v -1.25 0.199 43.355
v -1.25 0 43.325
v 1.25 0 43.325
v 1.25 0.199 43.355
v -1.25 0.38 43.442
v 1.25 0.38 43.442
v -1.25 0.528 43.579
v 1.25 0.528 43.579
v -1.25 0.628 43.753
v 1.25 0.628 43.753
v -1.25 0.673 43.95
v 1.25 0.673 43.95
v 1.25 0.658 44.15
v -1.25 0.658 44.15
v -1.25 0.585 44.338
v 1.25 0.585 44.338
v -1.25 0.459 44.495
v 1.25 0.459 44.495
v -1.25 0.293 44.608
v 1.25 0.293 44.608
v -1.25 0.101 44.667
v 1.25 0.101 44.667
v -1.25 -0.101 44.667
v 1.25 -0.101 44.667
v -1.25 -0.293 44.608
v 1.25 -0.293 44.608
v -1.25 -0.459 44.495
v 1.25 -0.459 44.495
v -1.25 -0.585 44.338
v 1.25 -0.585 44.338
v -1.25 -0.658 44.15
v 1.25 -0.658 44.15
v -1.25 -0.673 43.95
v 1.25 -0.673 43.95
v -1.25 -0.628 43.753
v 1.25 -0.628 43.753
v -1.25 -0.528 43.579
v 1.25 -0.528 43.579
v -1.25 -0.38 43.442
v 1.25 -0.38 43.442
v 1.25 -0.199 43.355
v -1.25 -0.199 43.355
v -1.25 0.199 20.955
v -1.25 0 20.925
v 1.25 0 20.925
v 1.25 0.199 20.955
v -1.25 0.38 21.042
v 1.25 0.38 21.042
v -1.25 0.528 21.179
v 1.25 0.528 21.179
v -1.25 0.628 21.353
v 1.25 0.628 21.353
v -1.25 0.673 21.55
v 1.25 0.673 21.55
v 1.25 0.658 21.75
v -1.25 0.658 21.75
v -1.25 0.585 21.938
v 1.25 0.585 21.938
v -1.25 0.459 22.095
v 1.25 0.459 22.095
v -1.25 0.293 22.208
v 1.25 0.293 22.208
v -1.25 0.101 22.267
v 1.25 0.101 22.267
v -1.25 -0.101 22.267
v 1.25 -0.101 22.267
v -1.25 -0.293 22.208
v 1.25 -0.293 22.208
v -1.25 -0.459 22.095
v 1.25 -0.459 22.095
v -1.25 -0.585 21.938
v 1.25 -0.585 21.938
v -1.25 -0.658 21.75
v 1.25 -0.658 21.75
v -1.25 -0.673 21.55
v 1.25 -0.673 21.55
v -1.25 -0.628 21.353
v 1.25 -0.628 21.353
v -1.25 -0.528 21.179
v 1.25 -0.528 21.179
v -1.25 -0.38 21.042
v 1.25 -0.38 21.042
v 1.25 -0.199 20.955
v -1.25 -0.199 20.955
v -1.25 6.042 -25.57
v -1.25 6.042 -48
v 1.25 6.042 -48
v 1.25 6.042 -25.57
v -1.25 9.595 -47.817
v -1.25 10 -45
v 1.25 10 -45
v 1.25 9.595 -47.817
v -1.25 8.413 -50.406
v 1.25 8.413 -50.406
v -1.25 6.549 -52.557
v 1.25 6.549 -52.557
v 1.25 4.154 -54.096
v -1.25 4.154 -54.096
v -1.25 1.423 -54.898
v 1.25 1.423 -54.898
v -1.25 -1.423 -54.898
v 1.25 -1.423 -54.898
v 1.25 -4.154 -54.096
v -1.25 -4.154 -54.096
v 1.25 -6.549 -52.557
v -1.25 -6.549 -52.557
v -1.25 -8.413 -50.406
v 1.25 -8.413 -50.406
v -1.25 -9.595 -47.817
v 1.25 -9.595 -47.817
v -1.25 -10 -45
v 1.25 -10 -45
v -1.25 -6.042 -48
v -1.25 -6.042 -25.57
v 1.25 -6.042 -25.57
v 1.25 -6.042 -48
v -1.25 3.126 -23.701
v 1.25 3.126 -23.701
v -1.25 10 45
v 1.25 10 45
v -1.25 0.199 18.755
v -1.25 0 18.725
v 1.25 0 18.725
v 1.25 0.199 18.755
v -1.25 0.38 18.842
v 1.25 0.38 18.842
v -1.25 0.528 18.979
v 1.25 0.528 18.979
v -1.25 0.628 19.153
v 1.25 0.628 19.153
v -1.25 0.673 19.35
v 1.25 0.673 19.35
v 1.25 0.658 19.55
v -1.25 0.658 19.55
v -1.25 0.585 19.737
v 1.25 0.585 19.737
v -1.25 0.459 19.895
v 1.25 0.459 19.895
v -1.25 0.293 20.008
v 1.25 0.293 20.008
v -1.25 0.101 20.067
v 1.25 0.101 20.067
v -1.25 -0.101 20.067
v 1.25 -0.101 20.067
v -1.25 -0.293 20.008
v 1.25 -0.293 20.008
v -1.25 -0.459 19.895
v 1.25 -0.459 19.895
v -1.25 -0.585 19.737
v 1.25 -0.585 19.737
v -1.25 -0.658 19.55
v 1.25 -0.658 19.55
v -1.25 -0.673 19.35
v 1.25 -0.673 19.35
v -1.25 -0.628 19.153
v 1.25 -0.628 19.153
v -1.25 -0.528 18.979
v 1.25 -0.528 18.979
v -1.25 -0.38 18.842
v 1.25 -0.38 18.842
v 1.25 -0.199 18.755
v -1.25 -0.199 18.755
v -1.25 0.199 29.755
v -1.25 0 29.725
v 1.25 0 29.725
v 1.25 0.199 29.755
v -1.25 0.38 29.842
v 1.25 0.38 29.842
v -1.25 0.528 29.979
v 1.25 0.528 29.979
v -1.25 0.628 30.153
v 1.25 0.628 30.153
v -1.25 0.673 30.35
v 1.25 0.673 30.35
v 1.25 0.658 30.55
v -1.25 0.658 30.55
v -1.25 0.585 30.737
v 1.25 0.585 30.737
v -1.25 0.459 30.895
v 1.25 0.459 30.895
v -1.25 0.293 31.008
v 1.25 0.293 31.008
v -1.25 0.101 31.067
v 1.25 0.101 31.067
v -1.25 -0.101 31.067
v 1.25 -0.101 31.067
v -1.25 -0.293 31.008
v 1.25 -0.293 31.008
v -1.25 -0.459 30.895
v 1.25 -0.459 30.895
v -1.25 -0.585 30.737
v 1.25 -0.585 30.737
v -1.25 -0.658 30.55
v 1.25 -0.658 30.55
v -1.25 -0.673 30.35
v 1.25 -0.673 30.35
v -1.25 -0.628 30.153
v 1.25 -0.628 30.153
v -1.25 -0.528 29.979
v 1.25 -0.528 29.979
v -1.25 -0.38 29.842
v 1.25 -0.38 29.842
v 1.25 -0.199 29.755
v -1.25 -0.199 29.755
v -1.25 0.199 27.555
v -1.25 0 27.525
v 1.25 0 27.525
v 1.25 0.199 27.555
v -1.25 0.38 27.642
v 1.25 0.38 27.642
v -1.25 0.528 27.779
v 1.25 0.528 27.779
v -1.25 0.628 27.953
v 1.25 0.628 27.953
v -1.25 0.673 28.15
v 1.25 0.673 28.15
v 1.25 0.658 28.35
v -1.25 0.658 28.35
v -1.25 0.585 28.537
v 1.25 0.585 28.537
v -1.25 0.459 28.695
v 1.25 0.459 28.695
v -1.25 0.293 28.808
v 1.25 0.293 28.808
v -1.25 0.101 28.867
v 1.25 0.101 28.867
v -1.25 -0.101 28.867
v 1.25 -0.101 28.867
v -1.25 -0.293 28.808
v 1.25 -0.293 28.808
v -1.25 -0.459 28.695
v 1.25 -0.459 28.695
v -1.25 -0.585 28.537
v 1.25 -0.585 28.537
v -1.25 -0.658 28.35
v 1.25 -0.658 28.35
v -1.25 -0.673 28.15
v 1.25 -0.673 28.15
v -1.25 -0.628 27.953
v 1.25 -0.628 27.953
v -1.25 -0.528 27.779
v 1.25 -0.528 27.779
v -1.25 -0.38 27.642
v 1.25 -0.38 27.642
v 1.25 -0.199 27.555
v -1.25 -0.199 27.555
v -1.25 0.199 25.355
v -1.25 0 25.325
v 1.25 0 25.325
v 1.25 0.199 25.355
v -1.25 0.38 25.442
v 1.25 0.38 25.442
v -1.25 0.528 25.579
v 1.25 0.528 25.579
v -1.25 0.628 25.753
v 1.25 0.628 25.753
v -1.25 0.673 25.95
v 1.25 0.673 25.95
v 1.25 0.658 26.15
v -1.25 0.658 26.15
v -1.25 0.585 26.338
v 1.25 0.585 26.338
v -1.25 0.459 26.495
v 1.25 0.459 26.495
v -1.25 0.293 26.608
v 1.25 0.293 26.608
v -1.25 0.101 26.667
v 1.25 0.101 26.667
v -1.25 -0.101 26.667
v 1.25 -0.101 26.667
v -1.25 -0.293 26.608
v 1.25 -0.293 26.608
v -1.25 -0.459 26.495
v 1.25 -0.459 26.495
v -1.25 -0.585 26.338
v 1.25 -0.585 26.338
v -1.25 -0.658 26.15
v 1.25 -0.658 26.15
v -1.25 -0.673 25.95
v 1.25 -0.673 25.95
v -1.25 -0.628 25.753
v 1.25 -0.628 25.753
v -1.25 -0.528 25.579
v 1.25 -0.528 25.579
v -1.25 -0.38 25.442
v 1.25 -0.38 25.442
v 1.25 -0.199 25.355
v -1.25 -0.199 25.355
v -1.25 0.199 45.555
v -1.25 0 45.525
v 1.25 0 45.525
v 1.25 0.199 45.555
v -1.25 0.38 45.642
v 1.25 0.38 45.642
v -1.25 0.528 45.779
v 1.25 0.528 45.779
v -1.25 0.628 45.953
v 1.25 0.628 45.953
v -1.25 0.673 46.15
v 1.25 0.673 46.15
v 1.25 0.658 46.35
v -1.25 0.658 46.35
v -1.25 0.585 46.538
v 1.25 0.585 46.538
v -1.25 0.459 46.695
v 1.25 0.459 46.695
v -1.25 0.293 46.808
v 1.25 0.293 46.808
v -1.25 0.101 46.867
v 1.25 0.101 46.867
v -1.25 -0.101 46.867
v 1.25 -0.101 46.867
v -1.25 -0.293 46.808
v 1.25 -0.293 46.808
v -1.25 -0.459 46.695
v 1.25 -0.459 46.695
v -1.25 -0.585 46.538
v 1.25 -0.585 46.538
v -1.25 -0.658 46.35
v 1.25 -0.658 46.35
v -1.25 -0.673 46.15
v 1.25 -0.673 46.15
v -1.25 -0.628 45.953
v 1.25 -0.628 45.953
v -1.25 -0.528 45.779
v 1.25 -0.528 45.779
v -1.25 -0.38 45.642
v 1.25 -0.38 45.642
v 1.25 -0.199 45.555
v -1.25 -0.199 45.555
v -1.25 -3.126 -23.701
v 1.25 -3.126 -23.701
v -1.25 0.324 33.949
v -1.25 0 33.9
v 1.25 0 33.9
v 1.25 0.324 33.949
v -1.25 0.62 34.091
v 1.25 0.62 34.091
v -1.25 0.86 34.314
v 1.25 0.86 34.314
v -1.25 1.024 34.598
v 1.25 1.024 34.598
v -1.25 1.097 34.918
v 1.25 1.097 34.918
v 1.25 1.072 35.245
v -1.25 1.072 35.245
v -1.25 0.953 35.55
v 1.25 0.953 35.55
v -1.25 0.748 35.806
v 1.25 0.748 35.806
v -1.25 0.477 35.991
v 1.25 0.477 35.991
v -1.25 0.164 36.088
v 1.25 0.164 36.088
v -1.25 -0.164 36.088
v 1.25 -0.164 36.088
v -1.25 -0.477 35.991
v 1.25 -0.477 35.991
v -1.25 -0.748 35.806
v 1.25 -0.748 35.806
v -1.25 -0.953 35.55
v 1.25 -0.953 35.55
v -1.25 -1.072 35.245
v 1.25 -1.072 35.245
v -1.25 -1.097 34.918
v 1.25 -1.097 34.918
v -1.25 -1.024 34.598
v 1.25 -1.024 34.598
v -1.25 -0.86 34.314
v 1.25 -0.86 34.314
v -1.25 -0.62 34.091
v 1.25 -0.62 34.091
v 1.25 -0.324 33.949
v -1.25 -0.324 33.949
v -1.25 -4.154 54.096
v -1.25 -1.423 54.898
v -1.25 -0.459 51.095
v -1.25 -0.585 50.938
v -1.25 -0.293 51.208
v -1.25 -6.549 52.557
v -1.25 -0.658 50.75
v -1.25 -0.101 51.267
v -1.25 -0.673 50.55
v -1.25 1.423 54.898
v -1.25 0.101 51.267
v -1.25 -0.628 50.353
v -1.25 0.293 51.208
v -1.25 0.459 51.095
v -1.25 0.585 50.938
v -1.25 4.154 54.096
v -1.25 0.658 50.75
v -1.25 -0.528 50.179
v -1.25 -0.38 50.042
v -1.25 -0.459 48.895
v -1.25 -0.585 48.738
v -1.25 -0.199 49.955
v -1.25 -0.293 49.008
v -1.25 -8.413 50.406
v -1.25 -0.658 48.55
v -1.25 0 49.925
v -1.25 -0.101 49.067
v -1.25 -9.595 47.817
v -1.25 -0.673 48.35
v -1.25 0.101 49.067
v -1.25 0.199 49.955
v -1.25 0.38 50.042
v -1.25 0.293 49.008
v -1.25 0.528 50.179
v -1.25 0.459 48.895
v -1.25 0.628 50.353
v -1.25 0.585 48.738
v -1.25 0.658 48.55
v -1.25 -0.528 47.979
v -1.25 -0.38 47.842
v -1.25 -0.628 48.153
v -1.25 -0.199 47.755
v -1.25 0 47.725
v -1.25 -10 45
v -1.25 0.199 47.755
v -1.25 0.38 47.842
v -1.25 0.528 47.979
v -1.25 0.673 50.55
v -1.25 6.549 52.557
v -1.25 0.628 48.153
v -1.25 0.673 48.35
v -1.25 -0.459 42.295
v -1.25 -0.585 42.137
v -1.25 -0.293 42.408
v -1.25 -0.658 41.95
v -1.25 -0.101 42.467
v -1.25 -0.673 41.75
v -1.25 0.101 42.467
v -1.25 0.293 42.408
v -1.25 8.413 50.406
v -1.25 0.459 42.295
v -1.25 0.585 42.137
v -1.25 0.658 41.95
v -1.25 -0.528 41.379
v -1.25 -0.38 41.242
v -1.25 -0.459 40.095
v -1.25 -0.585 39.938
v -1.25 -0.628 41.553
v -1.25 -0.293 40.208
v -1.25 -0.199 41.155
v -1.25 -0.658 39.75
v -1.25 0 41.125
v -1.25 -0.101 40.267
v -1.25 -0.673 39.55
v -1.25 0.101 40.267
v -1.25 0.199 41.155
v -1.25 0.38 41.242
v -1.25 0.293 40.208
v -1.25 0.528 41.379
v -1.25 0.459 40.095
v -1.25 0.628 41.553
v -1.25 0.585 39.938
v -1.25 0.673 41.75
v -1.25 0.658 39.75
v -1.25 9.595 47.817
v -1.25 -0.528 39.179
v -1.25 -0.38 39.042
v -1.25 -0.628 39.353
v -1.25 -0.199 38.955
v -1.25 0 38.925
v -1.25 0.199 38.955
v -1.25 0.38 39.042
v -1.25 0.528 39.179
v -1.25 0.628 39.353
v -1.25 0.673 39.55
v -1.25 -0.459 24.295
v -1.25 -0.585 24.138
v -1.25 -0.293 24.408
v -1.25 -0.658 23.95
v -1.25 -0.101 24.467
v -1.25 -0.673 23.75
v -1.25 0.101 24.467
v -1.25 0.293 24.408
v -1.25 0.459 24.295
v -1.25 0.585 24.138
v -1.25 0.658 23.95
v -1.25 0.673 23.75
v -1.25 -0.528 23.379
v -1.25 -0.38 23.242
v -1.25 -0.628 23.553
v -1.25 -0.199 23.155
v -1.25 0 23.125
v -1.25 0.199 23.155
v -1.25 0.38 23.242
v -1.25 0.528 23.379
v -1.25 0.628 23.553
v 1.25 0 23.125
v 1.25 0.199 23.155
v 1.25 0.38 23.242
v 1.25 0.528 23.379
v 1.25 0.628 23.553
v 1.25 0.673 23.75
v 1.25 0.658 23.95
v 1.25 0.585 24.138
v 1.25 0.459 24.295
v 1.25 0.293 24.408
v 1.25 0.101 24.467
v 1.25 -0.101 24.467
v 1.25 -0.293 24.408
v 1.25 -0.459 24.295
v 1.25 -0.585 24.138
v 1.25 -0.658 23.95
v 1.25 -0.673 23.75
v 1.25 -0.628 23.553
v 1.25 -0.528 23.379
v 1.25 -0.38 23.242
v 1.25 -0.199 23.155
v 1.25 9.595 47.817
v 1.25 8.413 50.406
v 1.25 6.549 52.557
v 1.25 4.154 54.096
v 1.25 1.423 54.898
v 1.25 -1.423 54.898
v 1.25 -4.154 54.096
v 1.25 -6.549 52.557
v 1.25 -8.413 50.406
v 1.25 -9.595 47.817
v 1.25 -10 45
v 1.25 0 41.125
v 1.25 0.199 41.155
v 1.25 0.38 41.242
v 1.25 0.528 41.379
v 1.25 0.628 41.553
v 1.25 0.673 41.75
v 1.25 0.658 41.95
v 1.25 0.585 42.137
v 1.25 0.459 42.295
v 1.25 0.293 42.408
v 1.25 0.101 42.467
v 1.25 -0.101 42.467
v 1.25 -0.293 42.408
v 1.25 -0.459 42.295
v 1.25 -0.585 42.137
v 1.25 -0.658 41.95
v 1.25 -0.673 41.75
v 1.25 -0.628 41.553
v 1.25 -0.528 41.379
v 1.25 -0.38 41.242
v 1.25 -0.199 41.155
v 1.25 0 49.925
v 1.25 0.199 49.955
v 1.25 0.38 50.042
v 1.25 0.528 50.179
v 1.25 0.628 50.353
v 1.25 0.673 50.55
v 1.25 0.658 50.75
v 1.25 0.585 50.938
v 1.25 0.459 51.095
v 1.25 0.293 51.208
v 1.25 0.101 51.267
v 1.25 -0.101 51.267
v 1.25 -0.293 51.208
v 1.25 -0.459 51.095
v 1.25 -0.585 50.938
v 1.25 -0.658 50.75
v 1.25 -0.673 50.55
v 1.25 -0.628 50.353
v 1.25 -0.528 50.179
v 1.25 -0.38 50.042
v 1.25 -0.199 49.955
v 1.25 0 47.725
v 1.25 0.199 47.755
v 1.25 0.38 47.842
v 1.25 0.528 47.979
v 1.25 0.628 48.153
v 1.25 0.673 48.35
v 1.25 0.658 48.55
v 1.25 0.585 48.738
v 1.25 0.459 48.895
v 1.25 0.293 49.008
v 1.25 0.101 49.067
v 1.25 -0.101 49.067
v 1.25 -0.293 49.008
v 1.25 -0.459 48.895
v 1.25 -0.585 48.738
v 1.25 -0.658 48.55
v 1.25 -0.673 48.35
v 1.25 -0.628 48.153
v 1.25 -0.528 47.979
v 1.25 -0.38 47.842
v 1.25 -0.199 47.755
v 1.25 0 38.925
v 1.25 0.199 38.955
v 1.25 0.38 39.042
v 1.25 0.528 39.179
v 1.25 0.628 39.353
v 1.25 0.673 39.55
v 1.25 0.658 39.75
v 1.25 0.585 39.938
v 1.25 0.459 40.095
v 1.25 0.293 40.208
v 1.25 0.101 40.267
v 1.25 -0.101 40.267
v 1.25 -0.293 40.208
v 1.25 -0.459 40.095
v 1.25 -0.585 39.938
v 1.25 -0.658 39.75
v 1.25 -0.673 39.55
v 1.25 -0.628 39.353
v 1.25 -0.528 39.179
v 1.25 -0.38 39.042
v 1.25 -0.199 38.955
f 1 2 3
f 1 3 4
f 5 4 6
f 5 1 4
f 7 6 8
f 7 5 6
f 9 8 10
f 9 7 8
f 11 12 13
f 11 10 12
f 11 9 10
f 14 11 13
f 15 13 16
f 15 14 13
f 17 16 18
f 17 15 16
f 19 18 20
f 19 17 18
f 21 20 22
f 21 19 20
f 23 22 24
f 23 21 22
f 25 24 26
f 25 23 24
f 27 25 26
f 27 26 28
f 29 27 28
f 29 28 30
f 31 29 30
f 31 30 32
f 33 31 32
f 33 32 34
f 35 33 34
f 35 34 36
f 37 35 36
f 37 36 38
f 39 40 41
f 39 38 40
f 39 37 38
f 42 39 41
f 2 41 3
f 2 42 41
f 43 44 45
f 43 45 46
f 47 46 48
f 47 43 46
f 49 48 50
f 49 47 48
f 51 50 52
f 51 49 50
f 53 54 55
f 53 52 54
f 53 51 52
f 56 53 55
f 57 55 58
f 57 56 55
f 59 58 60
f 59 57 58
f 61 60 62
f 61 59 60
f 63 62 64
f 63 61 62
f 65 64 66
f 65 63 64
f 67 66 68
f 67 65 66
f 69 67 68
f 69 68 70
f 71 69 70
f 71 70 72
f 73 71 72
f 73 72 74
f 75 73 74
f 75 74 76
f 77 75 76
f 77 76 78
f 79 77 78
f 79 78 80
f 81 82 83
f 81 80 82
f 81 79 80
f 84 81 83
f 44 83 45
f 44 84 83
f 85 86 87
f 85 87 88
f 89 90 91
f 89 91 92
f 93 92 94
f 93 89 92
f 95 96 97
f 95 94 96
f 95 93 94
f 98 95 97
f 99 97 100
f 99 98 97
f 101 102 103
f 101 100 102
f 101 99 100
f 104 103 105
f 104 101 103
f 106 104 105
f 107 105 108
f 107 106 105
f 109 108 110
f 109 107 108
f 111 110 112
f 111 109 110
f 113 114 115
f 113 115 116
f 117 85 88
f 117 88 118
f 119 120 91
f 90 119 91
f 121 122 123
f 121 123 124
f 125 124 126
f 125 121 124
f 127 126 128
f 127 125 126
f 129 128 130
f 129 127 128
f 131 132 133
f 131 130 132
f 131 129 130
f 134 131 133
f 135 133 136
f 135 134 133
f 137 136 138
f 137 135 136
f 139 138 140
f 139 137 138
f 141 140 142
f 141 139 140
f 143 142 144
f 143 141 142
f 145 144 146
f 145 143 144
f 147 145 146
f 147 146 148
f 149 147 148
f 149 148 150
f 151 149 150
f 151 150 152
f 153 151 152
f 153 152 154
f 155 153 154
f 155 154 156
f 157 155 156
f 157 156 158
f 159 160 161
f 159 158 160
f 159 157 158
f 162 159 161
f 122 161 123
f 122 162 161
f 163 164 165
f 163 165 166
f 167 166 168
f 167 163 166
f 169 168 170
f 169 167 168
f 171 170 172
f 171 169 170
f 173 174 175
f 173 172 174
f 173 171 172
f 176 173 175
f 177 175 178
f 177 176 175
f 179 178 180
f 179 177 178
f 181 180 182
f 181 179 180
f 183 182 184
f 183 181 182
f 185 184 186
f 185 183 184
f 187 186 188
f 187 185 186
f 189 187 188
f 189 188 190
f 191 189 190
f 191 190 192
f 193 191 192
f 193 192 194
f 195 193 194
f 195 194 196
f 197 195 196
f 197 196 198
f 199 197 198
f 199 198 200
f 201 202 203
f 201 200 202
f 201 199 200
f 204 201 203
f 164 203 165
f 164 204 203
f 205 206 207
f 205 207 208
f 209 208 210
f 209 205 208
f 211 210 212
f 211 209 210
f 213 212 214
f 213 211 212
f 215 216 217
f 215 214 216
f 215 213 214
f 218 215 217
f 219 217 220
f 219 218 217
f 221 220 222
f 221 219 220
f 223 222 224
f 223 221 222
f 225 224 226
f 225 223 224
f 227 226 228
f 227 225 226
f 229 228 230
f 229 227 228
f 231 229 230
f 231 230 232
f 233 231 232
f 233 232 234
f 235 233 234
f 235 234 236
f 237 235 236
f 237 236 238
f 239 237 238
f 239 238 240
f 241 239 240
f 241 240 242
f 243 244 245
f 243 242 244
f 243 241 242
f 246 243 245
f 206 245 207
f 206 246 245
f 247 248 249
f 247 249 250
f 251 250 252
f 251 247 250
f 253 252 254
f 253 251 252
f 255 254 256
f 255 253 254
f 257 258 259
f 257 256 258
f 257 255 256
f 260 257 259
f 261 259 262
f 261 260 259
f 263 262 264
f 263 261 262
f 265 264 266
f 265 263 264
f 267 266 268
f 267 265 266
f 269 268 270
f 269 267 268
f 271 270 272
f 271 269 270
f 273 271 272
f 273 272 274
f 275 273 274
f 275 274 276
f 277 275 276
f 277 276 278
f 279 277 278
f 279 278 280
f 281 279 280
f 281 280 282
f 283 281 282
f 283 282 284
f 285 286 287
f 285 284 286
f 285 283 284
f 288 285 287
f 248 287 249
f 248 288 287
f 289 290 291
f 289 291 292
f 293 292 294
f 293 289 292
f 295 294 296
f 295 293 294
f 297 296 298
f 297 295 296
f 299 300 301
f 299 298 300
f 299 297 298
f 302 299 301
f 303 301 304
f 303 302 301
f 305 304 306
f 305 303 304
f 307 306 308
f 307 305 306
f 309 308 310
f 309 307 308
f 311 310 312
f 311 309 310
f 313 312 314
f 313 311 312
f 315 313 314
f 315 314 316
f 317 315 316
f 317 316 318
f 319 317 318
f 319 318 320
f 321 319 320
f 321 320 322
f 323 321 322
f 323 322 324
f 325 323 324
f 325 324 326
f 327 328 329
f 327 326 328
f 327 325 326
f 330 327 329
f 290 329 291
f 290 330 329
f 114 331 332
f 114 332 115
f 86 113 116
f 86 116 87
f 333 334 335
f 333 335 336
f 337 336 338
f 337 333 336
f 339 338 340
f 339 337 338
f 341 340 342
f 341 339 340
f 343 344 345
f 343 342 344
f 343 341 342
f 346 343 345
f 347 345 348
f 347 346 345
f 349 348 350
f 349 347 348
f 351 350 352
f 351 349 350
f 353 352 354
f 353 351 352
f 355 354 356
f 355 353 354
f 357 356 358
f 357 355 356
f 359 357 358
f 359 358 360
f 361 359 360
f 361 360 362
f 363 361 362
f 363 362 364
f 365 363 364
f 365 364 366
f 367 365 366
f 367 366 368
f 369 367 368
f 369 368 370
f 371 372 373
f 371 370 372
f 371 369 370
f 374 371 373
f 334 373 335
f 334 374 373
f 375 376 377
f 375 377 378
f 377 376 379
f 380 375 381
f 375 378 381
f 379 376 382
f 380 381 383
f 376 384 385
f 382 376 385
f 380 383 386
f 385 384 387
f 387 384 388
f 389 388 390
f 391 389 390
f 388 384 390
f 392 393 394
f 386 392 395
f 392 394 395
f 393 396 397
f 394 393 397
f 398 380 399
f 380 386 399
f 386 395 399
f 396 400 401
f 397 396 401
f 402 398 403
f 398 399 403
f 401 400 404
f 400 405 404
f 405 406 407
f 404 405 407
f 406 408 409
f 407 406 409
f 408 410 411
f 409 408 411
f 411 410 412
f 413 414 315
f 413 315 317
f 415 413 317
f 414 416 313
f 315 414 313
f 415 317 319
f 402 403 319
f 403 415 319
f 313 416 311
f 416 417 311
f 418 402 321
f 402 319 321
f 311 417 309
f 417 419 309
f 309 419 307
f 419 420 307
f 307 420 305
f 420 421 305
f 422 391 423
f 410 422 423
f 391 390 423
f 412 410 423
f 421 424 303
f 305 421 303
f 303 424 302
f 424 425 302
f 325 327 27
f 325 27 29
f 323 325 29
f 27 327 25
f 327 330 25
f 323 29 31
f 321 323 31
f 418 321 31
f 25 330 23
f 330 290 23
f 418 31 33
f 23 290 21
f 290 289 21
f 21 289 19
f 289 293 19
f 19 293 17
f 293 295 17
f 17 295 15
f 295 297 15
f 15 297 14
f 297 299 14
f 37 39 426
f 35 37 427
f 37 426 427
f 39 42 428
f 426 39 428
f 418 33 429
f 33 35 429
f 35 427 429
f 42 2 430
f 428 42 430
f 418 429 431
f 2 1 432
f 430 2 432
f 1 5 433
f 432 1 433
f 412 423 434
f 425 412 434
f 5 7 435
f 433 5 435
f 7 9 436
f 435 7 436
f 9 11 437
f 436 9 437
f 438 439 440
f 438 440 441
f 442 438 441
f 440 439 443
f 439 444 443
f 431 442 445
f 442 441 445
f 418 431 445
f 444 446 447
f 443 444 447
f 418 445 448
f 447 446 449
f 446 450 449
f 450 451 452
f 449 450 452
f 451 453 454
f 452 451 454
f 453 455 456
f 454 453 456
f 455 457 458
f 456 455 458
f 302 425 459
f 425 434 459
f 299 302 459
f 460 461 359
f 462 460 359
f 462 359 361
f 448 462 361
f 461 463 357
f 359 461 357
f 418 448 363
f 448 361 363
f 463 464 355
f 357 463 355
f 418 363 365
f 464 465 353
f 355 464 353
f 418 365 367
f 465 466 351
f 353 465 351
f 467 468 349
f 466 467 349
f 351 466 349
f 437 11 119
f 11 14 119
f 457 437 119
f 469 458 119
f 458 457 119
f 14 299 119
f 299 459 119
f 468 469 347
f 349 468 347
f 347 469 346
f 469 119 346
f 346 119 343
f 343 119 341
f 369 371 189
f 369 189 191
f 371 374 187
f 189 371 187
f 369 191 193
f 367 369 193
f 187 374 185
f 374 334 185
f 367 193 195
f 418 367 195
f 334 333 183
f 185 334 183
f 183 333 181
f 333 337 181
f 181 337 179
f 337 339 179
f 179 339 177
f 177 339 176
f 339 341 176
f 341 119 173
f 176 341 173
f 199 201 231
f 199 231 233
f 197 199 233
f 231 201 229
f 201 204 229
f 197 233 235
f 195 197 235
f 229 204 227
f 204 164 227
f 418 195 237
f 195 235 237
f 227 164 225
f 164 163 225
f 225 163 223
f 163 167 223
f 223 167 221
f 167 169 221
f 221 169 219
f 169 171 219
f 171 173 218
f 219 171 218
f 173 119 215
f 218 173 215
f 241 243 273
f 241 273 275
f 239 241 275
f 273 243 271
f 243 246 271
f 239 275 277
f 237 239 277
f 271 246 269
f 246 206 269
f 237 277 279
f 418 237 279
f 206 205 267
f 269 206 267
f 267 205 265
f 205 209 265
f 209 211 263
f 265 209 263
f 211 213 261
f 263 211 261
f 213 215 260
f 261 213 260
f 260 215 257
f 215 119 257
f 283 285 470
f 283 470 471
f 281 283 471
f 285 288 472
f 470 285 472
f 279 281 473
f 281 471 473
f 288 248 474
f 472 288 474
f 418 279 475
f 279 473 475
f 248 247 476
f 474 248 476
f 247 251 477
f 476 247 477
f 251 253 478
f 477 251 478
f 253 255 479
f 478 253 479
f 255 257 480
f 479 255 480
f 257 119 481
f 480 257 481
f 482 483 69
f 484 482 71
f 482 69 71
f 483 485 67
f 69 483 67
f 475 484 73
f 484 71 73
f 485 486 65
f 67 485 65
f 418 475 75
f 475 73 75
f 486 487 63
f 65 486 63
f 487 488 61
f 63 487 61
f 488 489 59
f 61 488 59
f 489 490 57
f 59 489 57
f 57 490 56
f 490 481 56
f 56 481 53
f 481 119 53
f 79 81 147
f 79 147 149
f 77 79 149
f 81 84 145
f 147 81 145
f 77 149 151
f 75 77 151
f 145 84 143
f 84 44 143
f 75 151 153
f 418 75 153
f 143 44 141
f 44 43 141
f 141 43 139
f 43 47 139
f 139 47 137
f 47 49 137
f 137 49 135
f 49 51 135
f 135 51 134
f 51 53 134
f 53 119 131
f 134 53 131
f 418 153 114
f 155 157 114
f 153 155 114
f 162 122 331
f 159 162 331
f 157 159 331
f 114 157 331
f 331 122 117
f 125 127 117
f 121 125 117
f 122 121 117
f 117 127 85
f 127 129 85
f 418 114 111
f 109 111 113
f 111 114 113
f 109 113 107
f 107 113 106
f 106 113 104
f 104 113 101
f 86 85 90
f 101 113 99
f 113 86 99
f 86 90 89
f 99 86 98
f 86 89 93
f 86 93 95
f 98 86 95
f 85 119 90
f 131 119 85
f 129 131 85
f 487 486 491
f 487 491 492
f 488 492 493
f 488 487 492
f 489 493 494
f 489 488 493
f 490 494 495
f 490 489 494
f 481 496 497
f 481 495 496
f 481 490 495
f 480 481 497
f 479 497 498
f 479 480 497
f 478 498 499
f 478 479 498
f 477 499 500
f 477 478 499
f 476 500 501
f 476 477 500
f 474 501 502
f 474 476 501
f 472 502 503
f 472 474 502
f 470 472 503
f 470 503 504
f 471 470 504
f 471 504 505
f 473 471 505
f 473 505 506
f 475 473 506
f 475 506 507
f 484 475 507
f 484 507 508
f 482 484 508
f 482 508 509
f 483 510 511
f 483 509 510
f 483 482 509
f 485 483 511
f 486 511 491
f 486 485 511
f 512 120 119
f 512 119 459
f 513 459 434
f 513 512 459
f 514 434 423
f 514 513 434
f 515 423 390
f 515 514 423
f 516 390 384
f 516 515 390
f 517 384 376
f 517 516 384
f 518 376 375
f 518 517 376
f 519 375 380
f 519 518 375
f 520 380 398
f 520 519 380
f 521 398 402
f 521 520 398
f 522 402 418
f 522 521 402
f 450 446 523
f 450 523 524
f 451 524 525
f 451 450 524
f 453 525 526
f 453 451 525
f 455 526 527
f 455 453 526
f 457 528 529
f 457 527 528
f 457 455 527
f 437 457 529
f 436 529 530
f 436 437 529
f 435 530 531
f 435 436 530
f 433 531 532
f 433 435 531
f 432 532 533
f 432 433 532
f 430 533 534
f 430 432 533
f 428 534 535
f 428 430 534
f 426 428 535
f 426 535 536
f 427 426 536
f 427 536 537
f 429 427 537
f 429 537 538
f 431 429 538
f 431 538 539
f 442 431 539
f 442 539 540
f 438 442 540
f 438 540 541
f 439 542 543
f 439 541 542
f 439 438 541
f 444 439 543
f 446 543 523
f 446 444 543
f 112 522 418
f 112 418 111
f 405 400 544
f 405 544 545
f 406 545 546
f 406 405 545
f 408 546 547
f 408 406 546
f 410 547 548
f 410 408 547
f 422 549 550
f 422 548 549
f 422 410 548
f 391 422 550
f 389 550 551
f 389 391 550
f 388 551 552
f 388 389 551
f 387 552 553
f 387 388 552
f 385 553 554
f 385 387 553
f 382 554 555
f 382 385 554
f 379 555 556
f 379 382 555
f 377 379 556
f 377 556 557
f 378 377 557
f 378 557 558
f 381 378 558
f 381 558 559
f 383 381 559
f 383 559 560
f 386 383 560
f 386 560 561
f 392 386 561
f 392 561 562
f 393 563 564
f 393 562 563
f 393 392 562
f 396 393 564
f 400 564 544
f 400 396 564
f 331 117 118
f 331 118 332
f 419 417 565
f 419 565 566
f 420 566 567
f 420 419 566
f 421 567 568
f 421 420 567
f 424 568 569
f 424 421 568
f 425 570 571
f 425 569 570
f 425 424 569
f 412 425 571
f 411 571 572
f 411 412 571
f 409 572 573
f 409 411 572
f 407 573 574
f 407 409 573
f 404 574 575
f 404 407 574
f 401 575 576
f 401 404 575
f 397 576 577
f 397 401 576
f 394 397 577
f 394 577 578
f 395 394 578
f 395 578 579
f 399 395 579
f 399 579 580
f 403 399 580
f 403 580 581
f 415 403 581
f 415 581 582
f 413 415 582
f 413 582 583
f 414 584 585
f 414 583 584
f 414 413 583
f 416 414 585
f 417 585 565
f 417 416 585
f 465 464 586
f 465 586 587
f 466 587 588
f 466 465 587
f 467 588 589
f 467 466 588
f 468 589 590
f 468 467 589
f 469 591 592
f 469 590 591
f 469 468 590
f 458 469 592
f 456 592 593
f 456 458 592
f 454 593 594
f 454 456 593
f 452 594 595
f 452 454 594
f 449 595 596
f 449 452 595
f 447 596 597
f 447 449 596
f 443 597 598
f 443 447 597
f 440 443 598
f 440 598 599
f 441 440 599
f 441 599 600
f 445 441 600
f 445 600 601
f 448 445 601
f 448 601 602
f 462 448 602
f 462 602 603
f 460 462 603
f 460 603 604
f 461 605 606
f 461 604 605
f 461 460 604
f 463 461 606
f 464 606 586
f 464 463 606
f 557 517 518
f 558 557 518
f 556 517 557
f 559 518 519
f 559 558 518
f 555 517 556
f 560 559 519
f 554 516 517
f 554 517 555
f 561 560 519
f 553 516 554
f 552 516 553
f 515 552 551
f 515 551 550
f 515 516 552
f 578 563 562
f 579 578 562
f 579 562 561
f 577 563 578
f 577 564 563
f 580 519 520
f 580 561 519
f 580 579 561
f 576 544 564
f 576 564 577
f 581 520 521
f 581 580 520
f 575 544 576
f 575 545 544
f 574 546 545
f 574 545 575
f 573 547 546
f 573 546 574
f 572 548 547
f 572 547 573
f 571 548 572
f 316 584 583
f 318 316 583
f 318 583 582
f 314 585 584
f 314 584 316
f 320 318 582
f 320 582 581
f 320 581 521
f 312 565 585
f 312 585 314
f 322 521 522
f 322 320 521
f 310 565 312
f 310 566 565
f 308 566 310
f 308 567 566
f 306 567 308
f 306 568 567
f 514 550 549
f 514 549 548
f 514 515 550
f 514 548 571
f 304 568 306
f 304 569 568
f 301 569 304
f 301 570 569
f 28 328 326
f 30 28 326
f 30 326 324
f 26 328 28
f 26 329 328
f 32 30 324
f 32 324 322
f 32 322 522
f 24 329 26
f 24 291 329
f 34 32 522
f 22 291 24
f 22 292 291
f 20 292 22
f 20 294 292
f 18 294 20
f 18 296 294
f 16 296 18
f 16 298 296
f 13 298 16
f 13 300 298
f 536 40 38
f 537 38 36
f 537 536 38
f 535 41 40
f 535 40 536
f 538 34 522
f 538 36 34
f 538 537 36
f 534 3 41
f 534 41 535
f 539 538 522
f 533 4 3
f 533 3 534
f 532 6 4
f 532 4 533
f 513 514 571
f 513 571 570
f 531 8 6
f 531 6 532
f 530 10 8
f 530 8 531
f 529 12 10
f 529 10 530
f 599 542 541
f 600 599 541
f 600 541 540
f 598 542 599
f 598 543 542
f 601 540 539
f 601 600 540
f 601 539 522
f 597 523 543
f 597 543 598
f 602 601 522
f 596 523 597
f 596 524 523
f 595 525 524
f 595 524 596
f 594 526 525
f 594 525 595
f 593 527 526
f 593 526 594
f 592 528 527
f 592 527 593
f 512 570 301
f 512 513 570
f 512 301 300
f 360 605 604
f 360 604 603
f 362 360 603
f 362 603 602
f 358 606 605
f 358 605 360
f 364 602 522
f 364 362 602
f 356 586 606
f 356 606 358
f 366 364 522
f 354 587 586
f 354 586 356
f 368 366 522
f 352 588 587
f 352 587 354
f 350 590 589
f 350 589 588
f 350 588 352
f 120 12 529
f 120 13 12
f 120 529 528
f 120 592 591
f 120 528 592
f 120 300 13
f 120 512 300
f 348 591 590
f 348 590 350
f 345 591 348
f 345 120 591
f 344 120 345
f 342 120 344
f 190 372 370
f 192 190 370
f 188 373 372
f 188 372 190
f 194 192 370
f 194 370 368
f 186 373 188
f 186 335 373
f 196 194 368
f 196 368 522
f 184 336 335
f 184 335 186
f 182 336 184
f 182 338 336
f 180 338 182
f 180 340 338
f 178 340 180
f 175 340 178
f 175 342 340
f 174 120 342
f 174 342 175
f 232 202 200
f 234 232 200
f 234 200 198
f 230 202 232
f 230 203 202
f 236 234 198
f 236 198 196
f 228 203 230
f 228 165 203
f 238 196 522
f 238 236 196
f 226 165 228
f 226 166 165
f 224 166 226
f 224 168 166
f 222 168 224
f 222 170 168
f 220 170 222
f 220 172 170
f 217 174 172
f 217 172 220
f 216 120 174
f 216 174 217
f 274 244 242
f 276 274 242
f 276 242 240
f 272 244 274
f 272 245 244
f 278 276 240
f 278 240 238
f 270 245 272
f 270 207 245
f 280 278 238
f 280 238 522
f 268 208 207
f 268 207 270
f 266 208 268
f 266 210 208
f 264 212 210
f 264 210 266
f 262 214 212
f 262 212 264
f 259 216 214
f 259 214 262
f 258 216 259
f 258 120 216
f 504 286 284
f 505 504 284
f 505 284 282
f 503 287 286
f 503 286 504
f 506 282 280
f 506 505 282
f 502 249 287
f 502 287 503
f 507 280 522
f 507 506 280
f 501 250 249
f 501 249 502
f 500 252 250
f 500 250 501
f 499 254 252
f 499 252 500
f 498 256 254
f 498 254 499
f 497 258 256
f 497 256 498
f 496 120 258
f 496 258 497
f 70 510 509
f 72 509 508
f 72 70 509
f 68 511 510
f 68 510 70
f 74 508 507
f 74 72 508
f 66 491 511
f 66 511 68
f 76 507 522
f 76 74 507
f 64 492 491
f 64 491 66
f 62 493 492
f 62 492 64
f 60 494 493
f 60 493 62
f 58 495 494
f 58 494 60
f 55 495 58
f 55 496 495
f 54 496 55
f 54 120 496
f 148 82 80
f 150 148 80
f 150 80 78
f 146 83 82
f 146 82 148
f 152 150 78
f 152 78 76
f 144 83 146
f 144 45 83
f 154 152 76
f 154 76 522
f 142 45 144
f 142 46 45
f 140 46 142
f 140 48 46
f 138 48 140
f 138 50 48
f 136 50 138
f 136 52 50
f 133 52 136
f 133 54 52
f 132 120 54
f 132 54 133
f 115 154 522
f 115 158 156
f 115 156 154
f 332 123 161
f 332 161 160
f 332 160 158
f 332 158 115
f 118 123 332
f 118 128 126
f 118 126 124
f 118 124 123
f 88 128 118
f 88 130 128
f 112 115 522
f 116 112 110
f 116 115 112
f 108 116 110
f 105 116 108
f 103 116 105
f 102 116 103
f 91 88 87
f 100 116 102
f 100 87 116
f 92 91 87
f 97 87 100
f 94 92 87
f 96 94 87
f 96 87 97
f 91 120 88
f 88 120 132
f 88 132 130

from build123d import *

# Parameters (mm, degrees)
SKETCH1_W               = 110
SKETCH1_H               = 20
BOSS_EXTRUDE1_DEPTH     = 1.25
CUT_EXTRUDE1_DEPTH      = 56.957573214
CUT_EXTRUDE1_DEPTH_BACK = 56.957573214
SKETCH2_R               = 1.1
CUT_EXTRUDE2_DEPTH      = 56.957573214
CUT_EXTRUDE2_DEPTH_BACK = 56.957573214
SKETCH3_R               = 0.675
CUT_EXTRUDE3_DEPTH      = 56.957573214
CUT_EXTRUDE3_DEPTH_BACK = 56.957573214
FILLET2_RADIUS          = 10
FILLET2_LENGTH          = 2.5
FILLET3_RADIUS          = 10
FILLET3_LENGTH          = 2.5


with BuildPart() as part:
    # Sketch1 → Boss-Extrude1 (new, symmetric)
    with BuildSketch(Plane(origin=(0, 0, 0), x_dir=(0, 0, -1), z_dir=(1, 0, 0))):
        Rectangle(SKETCH1_W, SKETCH1_H)
    extrude(amount=BOSS_EXTRUDE1_DEPTH, both=True)

    # Sketch2 → Cut-Extrude1 (cut, two sides: drawn at the far end of the back side and taken through both)
    with BuildSketch(Plane(origin=(1.25, 0, 0), x_dir=(0, 0, -1), z_dir=(1, 0, 0)).offset(-CUT_EXTRUDE1_DEPTH_BACK)):
        with Locations((-35, 0)):
            Circle(SKETCH2_R)
    extrude(amount=CUT_EXTRUDE1_DEPTH + CUT_EXTRUDE1_DEPTH_BACK, mode=Mode.SUBTRACT)

    # Sketch3 → Cut-Extrude2 (cut, two sides: drawn at the far end of the back side and taken through both)
    with BuildSketch(Plane(origin=(1.25, 0, 0), x_dir=(0, 0, -1), z_dir=(1, 0, 0)).offset(-CUT_EXTRUDE2_DEPTH_BACK)):
        with Locations((-50.6, 0)):
            Circle(SKETCH3_R)
        with Locations((-48.4, 0)):
            Circle(SKETCH3_R)
        with Locations((-46.2, 0)):
            Circle(SKETCH3_R)
        with Locations((-44, 0)):
            Circle(SKETCH3_R)
        with Locations((-41.8, 0)):
            Circle(SKETCH3_R)
        with Locations((-39.6, 0)):
            Circle(SKETCH3_R)
        with Locations((-30.4, 0)):
            Circle(SKETCH3_R)
        with Locations((-28.2, 0)):
            Circle(SKETCH3_R)
        with Locations((-26, 0)):
            Circle(SKETCH3_R)
        with Locations((-23.8, 0)):
            Circle(SKETCH3_R)
        with Locations((-21.6, 0)):
            Circle(SKETCH3_R)
        with Locations((-19.4, 0)):
            Circle(SKETCH3_R)
    extrude(amount=CUT_EXTRUDE2_DEPTH + CUT_EXTRUDE2_DEPTH_BACK, mode=Mode.SUBTRACT)

    # Sketch4 → Cut-Extrude3 (cut, two sides: drawn at the far end of the back side and taken through both)
    with BuildSketch(Plane(origin=(1.25, 0, 0), x_dir=(0, 0, -1), z_dir=(1, 0, 0)).offset(-CUT_EXTRUDE3_DEPTH_BACK)):
        Polygon((25.569688234, -6.041537935), (48, -6.041537935), (48, 6.041537935), (25.569688234, 6.041537935), (23.701172911, 3.12608256), (23.701172911, -3.12608256), align=None)
    extrude(amount=CUT_EXTRUDE3_DEPTH + CUT_EXTRUDE3_DEPTH_BACK, mode=Mode.SUBTRACT)

    # Fillet2: full round fillet: the end face becomes a half cylinder, R = half its width
    fillet2_face = Plane((0, 0, -55), x_dir=(-1, 0, 0), z_dir=(0, 0, -1))  # on the end face: x along it, z out of the body
    fillet2_slab = fillet2_face.offset(-FILLET2_RADIUS / 2) * Box(FILLET2_LENGTH, 2 * FILLET2_RADIUS, FILLET2_RADIUS, mode=Mode.PRIVATE)  # the body's end, R deep
    fillet2_round = Plane((0, 0, -45), x_dir=(0, 0, -1), z_dir=(-1, 0, 0)) * Cylinder(FILLET2_RADIUS, FILLET2_LENGTH, mode=Mode.PRIVATE)  # its axis R under the face
    add(fillet2_slab - fillet2_round, mode=Mode.SUBTRACT)

    # Fillet3: full round fillet: the end face becomes a half cylinder, R = half its width
    fillet3_face = Plane((0, 0, 55), x_dir=(1, 0, 0), z_dir=(0, 0, 1))  # on the end face: x along it, z out of the body
    fillet3_slab = fillet3_face.offset(-FILLET3_RADIUS / 2) * Box(FILLET3_LENGTH, 2 * FILLET3_RADIUS, FILLET3_RADIUS, mode=Mode.PRIVATE)  # the body's end, R deep
    fillet3_round = Plane((0, 0, 45), x_dir=(0, 0, 1), z_dir=(1, 0, 0)) * Cylinder(FILLET3_RADIUS, FILLET3_LENGTH, mode=Mode.PRIVATE)  # its axis R under the face
    add(fillet3_slab - fillet3_round, mode=Mode.SUBTRACT)


solid = part.part
